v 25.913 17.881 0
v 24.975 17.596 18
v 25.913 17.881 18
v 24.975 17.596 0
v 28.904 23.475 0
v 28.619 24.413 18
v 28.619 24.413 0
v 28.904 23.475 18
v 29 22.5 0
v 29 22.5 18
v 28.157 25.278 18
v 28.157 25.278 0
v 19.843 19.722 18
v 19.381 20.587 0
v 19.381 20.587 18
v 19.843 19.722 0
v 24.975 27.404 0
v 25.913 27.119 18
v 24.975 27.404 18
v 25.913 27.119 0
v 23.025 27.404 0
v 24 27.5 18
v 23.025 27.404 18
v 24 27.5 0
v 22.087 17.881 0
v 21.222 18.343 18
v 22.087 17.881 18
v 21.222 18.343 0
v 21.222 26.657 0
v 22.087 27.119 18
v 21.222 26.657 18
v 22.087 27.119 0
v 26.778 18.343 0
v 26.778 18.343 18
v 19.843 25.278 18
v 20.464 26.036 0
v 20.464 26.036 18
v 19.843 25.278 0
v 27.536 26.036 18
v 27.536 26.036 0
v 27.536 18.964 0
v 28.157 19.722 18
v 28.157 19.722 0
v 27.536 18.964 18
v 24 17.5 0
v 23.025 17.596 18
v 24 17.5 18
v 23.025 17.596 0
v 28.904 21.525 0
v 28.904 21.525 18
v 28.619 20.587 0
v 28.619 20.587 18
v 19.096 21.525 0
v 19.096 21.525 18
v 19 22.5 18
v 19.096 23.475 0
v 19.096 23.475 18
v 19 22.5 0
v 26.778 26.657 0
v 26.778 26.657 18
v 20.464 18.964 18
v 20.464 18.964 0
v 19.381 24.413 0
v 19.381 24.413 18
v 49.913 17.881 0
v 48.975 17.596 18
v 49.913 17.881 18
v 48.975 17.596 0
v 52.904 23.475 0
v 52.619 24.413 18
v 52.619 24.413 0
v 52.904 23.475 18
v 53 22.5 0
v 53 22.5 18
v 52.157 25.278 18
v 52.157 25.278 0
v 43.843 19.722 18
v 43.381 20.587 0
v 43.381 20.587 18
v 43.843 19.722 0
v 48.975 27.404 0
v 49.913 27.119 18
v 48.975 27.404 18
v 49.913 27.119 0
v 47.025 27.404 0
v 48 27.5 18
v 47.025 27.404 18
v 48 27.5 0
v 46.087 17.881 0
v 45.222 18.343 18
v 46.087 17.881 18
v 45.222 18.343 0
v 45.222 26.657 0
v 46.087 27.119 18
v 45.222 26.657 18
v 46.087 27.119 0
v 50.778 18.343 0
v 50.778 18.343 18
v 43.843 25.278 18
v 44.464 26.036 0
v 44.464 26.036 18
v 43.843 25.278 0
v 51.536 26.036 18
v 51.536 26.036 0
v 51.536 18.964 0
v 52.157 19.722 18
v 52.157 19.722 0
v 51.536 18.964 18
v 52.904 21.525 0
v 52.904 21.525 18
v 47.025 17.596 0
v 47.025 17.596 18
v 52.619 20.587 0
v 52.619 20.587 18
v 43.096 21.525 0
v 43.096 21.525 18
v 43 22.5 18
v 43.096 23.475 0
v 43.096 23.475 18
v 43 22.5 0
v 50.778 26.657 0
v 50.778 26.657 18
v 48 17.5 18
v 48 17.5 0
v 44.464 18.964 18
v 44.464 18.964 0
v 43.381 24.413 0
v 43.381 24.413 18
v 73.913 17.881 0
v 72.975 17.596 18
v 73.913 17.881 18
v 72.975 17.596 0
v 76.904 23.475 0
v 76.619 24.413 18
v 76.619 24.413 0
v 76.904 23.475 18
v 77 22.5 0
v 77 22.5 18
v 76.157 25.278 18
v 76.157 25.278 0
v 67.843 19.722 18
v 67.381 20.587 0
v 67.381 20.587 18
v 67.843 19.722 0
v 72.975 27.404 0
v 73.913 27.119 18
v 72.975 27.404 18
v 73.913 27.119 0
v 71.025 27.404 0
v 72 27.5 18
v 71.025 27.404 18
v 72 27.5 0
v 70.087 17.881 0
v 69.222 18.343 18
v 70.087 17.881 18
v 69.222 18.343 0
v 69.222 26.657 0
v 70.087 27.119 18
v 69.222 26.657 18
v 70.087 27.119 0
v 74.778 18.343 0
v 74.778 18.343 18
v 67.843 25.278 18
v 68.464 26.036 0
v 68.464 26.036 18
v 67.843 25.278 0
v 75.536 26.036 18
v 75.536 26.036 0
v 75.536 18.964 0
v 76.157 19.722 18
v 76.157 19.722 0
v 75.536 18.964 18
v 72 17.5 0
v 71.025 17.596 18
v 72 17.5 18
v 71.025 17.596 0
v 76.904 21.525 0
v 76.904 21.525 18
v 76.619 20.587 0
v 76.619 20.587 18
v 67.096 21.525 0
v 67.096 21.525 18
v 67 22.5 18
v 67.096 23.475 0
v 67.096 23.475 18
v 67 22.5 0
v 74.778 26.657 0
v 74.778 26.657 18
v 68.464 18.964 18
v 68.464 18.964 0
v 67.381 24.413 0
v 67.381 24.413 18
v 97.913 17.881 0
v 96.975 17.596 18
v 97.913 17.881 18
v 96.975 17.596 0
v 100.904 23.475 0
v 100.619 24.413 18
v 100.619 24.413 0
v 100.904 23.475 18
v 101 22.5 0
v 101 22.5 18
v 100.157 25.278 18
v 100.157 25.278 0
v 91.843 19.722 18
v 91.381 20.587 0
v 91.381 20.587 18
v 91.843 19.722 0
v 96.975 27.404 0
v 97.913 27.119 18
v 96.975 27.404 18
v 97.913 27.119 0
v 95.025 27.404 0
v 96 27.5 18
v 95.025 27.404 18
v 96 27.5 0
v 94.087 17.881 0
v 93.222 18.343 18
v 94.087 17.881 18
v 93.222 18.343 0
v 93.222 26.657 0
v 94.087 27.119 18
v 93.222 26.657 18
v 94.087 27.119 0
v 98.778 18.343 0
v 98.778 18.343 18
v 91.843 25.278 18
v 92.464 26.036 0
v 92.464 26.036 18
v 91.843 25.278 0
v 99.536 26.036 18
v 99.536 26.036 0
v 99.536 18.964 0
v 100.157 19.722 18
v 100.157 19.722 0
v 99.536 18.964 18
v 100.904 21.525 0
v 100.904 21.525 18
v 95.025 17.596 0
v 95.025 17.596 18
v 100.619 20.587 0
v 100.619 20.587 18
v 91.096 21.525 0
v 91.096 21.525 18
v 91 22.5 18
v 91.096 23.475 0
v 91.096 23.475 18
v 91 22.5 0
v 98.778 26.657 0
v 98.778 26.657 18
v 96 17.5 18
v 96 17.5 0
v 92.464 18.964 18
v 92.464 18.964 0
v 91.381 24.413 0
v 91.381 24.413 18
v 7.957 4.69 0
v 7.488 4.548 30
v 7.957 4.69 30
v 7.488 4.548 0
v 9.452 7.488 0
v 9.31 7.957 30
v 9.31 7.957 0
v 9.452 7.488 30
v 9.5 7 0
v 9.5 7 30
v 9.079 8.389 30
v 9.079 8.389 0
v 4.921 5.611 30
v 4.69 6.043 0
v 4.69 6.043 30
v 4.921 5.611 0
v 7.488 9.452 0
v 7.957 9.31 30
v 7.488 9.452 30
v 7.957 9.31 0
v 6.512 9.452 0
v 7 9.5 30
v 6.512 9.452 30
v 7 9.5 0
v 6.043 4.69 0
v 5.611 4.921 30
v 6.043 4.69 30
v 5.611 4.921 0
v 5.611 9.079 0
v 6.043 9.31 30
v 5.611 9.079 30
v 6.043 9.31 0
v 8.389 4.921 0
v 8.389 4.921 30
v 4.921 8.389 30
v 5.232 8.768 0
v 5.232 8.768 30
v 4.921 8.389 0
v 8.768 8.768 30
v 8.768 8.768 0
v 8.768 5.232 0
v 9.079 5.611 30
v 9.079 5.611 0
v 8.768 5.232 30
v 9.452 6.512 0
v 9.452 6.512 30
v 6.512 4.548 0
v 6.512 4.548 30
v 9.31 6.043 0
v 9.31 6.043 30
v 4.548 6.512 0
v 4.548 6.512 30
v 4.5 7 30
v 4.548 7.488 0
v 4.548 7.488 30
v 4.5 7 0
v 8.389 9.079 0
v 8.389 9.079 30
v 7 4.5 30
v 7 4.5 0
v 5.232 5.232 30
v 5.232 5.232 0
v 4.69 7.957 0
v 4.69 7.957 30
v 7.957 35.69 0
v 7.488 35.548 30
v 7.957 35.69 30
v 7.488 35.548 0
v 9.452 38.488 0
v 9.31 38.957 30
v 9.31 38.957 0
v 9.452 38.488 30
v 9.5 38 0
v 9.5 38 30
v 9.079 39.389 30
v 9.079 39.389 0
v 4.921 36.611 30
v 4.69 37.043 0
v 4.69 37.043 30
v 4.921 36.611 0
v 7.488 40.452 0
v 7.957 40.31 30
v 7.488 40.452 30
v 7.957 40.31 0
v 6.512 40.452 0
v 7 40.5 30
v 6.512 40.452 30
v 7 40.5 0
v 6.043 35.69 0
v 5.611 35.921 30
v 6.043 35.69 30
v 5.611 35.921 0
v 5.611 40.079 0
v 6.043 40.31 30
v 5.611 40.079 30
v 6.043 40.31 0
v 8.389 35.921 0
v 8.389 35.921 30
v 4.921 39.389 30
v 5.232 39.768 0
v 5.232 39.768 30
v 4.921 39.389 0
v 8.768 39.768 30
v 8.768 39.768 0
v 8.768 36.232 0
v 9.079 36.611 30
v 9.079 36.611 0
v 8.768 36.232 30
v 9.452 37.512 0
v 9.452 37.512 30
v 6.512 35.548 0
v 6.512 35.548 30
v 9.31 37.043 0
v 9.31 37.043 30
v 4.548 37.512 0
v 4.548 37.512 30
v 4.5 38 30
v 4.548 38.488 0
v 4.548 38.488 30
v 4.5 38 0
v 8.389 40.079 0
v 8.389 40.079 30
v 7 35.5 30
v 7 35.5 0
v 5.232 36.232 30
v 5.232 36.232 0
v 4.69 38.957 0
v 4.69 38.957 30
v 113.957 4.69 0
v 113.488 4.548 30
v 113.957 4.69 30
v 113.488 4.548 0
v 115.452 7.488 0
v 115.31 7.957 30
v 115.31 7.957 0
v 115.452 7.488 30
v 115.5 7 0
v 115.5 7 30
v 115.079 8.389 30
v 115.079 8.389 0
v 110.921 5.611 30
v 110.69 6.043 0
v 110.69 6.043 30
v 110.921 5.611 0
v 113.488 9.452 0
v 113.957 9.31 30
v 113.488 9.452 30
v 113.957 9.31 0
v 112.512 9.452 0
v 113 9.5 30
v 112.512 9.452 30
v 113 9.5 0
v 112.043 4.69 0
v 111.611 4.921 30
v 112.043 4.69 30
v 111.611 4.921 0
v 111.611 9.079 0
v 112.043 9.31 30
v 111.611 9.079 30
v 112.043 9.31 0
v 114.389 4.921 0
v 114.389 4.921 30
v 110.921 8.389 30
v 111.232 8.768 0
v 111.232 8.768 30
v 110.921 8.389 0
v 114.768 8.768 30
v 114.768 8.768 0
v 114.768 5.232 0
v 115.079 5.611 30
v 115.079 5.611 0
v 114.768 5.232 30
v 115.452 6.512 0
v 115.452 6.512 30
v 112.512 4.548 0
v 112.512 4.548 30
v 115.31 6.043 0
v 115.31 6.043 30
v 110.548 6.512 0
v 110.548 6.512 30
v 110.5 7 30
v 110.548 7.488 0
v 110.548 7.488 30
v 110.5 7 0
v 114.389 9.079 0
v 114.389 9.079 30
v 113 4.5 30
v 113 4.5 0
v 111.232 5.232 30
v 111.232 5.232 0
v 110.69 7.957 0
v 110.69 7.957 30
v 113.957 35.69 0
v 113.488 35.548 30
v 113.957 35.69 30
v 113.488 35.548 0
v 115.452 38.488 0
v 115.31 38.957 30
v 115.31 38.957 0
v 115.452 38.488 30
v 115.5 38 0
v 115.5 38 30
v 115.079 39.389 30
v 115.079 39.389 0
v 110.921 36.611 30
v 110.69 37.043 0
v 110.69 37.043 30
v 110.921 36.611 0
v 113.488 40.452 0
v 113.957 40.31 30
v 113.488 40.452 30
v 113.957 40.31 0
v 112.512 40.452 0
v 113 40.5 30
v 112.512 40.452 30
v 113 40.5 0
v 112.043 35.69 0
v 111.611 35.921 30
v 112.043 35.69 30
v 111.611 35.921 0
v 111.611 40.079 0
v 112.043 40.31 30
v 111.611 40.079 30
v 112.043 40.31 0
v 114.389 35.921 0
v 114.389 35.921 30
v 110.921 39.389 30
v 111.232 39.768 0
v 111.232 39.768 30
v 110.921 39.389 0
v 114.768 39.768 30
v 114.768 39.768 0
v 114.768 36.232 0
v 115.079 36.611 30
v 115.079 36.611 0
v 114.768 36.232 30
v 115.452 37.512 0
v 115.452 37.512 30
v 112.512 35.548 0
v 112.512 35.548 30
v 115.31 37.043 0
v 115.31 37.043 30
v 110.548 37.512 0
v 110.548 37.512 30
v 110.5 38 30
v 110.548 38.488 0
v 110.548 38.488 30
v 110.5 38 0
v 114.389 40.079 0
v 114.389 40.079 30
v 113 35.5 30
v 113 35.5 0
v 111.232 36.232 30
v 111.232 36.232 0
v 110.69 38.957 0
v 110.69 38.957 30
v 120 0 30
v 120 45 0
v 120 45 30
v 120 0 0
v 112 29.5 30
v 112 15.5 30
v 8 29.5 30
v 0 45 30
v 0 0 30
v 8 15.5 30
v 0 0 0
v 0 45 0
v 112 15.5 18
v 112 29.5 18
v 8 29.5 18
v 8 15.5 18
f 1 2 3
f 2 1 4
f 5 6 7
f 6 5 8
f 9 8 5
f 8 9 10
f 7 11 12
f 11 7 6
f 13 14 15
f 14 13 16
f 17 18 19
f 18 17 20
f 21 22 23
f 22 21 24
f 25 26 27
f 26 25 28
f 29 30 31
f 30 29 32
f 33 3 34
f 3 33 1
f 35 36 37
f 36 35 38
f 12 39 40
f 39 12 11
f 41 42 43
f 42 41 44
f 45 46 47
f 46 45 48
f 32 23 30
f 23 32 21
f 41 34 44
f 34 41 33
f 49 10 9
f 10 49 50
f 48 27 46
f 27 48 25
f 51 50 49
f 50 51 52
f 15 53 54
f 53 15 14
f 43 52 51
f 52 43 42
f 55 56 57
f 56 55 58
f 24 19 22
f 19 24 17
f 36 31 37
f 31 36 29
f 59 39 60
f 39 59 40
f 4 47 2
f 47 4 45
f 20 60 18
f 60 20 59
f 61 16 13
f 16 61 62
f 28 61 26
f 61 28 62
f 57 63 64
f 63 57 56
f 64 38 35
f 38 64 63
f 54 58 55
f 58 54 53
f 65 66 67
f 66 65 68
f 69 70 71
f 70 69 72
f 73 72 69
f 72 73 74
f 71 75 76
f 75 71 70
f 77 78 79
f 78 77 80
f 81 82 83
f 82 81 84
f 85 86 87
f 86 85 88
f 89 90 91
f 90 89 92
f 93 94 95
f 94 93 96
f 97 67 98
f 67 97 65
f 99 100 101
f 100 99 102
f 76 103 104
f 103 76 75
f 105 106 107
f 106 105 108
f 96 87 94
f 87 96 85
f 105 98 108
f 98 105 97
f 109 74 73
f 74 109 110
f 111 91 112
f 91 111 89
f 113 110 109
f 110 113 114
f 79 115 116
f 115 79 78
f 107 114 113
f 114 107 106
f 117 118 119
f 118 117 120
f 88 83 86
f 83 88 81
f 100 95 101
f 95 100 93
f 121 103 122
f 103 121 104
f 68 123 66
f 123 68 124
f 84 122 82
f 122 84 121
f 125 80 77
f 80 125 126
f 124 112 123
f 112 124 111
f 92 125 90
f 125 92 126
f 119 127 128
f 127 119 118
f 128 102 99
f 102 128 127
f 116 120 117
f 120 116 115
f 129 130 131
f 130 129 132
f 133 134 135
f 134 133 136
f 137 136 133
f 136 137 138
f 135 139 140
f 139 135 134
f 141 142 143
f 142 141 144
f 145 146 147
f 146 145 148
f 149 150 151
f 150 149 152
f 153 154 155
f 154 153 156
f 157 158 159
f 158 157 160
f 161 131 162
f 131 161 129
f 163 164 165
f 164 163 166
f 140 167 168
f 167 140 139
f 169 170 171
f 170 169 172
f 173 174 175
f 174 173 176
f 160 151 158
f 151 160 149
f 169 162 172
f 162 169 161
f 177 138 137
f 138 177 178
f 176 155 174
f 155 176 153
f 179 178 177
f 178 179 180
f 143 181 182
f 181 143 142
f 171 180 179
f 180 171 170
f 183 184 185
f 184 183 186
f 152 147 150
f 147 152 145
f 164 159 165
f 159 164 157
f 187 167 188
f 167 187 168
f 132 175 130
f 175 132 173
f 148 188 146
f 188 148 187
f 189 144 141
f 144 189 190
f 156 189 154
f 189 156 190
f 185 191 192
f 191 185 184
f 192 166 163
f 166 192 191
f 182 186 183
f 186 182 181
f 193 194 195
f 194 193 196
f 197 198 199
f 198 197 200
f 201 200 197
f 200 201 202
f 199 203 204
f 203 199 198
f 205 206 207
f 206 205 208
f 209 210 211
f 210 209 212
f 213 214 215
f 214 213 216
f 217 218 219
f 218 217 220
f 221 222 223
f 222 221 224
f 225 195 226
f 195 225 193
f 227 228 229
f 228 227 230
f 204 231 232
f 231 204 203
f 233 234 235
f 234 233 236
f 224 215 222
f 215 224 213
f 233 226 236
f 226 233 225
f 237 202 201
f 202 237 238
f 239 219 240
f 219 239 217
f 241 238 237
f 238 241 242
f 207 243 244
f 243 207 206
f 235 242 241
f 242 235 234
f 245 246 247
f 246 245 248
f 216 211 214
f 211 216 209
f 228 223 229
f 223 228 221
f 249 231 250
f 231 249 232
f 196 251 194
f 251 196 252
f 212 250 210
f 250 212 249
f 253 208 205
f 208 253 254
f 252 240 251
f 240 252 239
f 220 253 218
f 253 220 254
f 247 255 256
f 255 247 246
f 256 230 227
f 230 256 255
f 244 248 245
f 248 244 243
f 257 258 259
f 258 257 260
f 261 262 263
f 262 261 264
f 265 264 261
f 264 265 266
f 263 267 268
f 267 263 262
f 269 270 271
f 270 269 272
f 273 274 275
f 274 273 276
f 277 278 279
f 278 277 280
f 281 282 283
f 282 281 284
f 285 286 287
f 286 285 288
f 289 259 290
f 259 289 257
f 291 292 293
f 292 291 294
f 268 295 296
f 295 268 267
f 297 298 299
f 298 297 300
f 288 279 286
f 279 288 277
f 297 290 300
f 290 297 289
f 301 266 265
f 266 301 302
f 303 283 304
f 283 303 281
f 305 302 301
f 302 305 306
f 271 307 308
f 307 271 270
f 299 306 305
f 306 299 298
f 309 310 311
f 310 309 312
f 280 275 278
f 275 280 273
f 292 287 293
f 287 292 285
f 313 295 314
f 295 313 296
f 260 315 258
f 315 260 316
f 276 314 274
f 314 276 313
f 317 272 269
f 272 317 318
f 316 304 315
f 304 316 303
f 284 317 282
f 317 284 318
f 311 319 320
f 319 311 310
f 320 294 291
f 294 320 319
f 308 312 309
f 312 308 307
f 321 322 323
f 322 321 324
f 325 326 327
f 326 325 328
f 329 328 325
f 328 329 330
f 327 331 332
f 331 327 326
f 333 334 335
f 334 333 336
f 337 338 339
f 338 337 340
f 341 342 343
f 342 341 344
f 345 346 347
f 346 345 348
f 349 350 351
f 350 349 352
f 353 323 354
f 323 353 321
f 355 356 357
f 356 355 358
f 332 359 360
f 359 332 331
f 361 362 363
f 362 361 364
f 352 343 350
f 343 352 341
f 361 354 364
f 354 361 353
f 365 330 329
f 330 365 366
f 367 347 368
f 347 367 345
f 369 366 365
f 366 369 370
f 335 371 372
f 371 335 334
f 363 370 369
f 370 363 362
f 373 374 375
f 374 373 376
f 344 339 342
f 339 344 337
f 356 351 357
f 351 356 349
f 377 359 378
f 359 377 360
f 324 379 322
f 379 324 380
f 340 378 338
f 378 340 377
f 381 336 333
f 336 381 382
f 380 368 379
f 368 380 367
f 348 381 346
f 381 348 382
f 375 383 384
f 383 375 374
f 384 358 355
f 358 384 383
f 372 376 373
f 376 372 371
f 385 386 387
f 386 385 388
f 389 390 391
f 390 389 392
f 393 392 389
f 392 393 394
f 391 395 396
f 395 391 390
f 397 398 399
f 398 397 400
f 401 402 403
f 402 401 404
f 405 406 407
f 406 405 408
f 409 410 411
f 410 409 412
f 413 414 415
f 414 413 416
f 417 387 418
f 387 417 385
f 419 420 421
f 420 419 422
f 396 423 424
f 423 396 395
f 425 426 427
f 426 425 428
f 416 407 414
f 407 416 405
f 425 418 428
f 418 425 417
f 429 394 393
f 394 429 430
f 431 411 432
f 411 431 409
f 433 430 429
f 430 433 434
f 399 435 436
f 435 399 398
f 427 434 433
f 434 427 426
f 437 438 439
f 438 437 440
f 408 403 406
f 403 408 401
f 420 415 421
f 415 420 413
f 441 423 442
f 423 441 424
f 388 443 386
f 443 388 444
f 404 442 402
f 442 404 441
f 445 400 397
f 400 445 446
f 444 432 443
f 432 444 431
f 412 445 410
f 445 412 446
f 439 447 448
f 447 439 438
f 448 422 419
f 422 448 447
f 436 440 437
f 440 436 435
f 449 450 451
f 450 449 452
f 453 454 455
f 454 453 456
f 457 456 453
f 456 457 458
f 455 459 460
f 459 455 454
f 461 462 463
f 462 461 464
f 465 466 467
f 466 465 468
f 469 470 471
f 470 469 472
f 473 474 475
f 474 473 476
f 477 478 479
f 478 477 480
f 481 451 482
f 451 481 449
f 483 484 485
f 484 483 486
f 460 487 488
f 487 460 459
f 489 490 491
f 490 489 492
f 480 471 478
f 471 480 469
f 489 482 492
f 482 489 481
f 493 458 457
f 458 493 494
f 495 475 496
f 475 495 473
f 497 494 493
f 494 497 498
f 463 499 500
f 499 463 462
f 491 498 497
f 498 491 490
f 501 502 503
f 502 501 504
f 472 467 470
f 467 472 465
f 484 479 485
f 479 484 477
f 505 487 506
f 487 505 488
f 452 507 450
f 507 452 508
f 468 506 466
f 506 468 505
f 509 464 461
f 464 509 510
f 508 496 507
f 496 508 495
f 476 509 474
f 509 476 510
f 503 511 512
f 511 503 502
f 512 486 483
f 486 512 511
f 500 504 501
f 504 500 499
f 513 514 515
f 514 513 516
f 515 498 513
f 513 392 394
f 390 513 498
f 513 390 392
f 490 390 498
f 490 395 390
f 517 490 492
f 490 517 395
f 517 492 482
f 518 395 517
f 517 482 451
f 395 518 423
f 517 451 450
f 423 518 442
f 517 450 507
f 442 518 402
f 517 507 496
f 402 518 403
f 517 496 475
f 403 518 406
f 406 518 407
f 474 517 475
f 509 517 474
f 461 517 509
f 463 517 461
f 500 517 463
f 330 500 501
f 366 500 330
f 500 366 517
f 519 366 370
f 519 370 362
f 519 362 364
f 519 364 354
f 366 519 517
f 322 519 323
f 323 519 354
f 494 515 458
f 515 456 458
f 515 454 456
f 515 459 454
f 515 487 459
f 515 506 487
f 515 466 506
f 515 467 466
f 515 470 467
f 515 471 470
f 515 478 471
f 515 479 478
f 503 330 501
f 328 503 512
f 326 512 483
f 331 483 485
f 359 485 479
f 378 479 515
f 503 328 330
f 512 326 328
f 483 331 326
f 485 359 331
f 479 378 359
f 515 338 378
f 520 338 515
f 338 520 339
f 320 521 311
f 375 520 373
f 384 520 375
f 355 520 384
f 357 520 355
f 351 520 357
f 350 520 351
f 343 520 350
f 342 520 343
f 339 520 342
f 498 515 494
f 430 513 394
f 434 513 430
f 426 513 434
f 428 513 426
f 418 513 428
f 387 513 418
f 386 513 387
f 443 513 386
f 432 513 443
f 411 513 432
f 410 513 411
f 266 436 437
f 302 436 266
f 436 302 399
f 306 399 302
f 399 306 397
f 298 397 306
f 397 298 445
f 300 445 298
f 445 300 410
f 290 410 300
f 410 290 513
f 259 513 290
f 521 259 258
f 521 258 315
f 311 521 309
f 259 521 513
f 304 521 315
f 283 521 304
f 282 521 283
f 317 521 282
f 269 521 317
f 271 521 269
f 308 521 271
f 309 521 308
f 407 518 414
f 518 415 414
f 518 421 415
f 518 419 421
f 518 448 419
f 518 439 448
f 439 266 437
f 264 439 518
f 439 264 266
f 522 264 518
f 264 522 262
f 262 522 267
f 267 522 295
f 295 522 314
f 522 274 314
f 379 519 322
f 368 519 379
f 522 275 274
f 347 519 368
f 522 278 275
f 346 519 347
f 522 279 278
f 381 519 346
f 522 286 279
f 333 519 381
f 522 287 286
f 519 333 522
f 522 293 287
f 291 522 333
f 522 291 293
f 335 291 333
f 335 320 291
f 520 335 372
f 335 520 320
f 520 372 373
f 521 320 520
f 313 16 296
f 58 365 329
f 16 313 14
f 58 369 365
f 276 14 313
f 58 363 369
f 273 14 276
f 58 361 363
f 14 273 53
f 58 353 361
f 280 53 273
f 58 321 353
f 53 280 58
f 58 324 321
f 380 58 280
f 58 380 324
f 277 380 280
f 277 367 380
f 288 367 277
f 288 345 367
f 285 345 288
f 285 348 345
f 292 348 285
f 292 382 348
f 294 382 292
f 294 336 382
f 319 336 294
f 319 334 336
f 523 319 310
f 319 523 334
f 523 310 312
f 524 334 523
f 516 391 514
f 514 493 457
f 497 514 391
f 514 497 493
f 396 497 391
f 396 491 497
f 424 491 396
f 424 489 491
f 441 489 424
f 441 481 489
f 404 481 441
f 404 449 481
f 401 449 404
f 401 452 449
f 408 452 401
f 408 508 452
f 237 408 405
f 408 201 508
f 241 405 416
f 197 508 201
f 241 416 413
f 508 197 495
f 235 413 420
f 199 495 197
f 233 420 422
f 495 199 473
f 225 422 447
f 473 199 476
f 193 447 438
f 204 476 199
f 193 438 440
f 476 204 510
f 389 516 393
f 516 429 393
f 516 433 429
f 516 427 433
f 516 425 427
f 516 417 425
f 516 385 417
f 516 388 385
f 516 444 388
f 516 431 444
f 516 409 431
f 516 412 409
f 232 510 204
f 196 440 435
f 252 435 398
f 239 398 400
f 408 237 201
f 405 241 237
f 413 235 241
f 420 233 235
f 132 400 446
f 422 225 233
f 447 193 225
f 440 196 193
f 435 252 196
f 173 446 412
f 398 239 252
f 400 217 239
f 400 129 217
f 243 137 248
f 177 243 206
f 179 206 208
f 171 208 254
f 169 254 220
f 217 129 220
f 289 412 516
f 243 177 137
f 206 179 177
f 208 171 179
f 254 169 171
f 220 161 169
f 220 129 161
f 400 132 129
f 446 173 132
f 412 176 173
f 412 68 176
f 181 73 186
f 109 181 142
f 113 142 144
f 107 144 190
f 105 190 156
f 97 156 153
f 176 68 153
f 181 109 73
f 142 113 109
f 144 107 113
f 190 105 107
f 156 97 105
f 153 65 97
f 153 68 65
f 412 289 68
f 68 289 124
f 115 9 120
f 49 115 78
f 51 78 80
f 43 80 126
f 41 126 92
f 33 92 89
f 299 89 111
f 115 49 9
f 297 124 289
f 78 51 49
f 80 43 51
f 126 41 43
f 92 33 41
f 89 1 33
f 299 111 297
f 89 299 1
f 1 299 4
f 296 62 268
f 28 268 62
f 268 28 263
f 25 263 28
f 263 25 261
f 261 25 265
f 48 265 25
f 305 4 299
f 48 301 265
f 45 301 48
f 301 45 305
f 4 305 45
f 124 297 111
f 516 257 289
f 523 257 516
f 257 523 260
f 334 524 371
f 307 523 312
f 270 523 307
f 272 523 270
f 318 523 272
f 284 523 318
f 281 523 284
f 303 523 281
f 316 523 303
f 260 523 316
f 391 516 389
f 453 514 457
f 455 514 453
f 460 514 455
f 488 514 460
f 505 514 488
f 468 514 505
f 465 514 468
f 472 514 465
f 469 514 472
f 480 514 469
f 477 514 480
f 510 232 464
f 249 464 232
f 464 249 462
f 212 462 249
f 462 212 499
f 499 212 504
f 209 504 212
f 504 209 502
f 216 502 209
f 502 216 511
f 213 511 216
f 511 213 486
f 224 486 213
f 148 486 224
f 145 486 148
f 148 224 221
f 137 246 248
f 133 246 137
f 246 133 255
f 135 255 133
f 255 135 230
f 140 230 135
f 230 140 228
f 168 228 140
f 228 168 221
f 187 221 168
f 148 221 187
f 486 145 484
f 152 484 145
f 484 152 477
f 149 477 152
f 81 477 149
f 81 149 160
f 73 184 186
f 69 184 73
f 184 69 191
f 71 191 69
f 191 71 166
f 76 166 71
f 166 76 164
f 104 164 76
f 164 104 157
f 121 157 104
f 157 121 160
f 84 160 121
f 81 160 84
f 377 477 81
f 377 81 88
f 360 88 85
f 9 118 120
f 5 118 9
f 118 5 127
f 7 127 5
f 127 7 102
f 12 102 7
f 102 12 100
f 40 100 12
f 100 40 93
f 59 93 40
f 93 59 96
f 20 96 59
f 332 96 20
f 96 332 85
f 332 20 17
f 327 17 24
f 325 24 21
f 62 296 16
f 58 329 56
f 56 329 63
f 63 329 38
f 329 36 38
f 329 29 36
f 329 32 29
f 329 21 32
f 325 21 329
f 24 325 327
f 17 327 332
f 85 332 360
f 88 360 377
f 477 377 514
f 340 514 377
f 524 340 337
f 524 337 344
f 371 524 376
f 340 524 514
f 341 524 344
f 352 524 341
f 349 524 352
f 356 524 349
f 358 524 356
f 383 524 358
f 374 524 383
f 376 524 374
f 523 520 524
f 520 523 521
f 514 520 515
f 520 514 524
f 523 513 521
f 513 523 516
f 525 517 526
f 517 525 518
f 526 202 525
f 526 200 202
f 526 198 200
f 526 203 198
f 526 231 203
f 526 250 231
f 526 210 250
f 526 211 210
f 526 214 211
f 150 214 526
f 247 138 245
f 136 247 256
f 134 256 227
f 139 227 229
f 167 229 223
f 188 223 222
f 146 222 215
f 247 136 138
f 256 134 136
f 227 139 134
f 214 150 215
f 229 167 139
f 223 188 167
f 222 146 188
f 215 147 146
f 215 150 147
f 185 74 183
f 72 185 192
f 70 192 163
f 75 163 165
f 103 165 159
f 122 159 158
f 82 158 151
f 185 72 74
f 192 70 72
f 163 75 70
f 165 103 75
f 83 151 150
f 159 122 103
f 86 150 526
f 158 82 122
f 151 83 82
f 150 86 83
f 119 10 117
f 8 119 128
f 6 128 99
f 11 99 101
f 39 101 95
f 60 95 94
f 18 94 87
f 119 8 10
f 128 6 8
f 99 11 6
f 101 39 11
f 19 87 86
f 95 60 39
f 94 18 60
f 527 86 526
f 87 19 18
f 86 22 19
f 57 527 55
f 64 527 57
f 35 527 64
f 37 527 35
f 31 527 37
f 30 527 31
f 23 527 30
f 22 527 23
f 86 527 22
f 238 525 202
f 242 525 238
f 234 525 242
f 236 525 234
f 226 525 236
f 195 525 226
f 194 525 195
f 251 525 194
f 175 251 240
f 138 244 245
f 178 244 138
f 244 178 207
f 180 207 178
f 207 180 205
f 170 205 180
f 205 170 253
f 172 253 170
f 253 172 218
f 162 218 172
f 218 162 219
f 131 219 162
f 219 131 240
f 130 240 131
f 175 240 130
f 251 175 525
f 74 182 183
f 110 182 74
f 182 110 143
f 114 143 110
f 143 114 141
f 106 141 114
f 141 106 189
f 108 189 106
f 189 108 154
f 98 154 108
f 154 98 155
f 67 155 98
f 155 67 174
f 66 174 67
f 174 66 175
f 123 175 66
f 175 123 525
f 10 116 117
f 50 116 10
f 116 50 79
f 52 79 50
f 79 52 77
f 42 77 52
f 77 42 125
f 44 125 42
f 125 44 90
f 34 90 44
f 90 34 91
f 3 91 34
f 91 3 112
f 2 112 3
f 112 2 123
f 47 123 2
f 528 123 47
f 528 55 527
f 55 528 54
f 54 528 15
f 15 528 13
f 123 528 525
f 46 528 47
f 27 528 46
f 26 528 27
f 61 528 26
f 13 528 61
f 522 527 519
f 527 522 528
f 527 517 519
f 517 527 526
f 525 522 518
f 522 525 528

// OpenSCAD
$fn = 32;

// ----------------------------------------------------------------------
// Manifold block: gallery_top manifold
// ----------------------------------------------------------------------

// --- parameters (mm) ---
block_l = 120;            // block length, X
block_w = 45;             // block width, Y
block_h = 30;             // block height, Z
port_d = 10;              // port bore diameter
port_pitch = 24;          // port pitch along X
gallery_d = 14;           // top gallery width, Y
gallery_depth = 12;       // gallery pocket depth
wall_p = 8;               // gallery end wall thickness, X
mnt_d = 5;                // mounting hole diameter
mnt_in = 7;               // mounting hole inset from the edges

n_ports = 4;  // ports in the row
port_x0 = (block_l - (n_ports - 1) * port_pitch) / 2;  // first port X

difference() {
  cube([block_l, block_w, block_h]);
  for (i = [0 : n_ports - 1])
    translate([port_x0 + i * port_pitch, block_w / 2, -1])
      cylinder(h = block_h + 2, d = port_d);
  translate([wall_p, block_w / 2 - gallery_d / 2, block_h - gallery_depth])
    cube([block_l - 2 * wall_p, gallery_d, gallery_depth + 1]);
  for (cx = [mnt_in, block_l - mnt_in])
    for (cy = [mnt_in, block_w - mnt_in])
      translate([cx, cy, -1]) cylinder(h = block_h + 2, d = mnt_d);
}
